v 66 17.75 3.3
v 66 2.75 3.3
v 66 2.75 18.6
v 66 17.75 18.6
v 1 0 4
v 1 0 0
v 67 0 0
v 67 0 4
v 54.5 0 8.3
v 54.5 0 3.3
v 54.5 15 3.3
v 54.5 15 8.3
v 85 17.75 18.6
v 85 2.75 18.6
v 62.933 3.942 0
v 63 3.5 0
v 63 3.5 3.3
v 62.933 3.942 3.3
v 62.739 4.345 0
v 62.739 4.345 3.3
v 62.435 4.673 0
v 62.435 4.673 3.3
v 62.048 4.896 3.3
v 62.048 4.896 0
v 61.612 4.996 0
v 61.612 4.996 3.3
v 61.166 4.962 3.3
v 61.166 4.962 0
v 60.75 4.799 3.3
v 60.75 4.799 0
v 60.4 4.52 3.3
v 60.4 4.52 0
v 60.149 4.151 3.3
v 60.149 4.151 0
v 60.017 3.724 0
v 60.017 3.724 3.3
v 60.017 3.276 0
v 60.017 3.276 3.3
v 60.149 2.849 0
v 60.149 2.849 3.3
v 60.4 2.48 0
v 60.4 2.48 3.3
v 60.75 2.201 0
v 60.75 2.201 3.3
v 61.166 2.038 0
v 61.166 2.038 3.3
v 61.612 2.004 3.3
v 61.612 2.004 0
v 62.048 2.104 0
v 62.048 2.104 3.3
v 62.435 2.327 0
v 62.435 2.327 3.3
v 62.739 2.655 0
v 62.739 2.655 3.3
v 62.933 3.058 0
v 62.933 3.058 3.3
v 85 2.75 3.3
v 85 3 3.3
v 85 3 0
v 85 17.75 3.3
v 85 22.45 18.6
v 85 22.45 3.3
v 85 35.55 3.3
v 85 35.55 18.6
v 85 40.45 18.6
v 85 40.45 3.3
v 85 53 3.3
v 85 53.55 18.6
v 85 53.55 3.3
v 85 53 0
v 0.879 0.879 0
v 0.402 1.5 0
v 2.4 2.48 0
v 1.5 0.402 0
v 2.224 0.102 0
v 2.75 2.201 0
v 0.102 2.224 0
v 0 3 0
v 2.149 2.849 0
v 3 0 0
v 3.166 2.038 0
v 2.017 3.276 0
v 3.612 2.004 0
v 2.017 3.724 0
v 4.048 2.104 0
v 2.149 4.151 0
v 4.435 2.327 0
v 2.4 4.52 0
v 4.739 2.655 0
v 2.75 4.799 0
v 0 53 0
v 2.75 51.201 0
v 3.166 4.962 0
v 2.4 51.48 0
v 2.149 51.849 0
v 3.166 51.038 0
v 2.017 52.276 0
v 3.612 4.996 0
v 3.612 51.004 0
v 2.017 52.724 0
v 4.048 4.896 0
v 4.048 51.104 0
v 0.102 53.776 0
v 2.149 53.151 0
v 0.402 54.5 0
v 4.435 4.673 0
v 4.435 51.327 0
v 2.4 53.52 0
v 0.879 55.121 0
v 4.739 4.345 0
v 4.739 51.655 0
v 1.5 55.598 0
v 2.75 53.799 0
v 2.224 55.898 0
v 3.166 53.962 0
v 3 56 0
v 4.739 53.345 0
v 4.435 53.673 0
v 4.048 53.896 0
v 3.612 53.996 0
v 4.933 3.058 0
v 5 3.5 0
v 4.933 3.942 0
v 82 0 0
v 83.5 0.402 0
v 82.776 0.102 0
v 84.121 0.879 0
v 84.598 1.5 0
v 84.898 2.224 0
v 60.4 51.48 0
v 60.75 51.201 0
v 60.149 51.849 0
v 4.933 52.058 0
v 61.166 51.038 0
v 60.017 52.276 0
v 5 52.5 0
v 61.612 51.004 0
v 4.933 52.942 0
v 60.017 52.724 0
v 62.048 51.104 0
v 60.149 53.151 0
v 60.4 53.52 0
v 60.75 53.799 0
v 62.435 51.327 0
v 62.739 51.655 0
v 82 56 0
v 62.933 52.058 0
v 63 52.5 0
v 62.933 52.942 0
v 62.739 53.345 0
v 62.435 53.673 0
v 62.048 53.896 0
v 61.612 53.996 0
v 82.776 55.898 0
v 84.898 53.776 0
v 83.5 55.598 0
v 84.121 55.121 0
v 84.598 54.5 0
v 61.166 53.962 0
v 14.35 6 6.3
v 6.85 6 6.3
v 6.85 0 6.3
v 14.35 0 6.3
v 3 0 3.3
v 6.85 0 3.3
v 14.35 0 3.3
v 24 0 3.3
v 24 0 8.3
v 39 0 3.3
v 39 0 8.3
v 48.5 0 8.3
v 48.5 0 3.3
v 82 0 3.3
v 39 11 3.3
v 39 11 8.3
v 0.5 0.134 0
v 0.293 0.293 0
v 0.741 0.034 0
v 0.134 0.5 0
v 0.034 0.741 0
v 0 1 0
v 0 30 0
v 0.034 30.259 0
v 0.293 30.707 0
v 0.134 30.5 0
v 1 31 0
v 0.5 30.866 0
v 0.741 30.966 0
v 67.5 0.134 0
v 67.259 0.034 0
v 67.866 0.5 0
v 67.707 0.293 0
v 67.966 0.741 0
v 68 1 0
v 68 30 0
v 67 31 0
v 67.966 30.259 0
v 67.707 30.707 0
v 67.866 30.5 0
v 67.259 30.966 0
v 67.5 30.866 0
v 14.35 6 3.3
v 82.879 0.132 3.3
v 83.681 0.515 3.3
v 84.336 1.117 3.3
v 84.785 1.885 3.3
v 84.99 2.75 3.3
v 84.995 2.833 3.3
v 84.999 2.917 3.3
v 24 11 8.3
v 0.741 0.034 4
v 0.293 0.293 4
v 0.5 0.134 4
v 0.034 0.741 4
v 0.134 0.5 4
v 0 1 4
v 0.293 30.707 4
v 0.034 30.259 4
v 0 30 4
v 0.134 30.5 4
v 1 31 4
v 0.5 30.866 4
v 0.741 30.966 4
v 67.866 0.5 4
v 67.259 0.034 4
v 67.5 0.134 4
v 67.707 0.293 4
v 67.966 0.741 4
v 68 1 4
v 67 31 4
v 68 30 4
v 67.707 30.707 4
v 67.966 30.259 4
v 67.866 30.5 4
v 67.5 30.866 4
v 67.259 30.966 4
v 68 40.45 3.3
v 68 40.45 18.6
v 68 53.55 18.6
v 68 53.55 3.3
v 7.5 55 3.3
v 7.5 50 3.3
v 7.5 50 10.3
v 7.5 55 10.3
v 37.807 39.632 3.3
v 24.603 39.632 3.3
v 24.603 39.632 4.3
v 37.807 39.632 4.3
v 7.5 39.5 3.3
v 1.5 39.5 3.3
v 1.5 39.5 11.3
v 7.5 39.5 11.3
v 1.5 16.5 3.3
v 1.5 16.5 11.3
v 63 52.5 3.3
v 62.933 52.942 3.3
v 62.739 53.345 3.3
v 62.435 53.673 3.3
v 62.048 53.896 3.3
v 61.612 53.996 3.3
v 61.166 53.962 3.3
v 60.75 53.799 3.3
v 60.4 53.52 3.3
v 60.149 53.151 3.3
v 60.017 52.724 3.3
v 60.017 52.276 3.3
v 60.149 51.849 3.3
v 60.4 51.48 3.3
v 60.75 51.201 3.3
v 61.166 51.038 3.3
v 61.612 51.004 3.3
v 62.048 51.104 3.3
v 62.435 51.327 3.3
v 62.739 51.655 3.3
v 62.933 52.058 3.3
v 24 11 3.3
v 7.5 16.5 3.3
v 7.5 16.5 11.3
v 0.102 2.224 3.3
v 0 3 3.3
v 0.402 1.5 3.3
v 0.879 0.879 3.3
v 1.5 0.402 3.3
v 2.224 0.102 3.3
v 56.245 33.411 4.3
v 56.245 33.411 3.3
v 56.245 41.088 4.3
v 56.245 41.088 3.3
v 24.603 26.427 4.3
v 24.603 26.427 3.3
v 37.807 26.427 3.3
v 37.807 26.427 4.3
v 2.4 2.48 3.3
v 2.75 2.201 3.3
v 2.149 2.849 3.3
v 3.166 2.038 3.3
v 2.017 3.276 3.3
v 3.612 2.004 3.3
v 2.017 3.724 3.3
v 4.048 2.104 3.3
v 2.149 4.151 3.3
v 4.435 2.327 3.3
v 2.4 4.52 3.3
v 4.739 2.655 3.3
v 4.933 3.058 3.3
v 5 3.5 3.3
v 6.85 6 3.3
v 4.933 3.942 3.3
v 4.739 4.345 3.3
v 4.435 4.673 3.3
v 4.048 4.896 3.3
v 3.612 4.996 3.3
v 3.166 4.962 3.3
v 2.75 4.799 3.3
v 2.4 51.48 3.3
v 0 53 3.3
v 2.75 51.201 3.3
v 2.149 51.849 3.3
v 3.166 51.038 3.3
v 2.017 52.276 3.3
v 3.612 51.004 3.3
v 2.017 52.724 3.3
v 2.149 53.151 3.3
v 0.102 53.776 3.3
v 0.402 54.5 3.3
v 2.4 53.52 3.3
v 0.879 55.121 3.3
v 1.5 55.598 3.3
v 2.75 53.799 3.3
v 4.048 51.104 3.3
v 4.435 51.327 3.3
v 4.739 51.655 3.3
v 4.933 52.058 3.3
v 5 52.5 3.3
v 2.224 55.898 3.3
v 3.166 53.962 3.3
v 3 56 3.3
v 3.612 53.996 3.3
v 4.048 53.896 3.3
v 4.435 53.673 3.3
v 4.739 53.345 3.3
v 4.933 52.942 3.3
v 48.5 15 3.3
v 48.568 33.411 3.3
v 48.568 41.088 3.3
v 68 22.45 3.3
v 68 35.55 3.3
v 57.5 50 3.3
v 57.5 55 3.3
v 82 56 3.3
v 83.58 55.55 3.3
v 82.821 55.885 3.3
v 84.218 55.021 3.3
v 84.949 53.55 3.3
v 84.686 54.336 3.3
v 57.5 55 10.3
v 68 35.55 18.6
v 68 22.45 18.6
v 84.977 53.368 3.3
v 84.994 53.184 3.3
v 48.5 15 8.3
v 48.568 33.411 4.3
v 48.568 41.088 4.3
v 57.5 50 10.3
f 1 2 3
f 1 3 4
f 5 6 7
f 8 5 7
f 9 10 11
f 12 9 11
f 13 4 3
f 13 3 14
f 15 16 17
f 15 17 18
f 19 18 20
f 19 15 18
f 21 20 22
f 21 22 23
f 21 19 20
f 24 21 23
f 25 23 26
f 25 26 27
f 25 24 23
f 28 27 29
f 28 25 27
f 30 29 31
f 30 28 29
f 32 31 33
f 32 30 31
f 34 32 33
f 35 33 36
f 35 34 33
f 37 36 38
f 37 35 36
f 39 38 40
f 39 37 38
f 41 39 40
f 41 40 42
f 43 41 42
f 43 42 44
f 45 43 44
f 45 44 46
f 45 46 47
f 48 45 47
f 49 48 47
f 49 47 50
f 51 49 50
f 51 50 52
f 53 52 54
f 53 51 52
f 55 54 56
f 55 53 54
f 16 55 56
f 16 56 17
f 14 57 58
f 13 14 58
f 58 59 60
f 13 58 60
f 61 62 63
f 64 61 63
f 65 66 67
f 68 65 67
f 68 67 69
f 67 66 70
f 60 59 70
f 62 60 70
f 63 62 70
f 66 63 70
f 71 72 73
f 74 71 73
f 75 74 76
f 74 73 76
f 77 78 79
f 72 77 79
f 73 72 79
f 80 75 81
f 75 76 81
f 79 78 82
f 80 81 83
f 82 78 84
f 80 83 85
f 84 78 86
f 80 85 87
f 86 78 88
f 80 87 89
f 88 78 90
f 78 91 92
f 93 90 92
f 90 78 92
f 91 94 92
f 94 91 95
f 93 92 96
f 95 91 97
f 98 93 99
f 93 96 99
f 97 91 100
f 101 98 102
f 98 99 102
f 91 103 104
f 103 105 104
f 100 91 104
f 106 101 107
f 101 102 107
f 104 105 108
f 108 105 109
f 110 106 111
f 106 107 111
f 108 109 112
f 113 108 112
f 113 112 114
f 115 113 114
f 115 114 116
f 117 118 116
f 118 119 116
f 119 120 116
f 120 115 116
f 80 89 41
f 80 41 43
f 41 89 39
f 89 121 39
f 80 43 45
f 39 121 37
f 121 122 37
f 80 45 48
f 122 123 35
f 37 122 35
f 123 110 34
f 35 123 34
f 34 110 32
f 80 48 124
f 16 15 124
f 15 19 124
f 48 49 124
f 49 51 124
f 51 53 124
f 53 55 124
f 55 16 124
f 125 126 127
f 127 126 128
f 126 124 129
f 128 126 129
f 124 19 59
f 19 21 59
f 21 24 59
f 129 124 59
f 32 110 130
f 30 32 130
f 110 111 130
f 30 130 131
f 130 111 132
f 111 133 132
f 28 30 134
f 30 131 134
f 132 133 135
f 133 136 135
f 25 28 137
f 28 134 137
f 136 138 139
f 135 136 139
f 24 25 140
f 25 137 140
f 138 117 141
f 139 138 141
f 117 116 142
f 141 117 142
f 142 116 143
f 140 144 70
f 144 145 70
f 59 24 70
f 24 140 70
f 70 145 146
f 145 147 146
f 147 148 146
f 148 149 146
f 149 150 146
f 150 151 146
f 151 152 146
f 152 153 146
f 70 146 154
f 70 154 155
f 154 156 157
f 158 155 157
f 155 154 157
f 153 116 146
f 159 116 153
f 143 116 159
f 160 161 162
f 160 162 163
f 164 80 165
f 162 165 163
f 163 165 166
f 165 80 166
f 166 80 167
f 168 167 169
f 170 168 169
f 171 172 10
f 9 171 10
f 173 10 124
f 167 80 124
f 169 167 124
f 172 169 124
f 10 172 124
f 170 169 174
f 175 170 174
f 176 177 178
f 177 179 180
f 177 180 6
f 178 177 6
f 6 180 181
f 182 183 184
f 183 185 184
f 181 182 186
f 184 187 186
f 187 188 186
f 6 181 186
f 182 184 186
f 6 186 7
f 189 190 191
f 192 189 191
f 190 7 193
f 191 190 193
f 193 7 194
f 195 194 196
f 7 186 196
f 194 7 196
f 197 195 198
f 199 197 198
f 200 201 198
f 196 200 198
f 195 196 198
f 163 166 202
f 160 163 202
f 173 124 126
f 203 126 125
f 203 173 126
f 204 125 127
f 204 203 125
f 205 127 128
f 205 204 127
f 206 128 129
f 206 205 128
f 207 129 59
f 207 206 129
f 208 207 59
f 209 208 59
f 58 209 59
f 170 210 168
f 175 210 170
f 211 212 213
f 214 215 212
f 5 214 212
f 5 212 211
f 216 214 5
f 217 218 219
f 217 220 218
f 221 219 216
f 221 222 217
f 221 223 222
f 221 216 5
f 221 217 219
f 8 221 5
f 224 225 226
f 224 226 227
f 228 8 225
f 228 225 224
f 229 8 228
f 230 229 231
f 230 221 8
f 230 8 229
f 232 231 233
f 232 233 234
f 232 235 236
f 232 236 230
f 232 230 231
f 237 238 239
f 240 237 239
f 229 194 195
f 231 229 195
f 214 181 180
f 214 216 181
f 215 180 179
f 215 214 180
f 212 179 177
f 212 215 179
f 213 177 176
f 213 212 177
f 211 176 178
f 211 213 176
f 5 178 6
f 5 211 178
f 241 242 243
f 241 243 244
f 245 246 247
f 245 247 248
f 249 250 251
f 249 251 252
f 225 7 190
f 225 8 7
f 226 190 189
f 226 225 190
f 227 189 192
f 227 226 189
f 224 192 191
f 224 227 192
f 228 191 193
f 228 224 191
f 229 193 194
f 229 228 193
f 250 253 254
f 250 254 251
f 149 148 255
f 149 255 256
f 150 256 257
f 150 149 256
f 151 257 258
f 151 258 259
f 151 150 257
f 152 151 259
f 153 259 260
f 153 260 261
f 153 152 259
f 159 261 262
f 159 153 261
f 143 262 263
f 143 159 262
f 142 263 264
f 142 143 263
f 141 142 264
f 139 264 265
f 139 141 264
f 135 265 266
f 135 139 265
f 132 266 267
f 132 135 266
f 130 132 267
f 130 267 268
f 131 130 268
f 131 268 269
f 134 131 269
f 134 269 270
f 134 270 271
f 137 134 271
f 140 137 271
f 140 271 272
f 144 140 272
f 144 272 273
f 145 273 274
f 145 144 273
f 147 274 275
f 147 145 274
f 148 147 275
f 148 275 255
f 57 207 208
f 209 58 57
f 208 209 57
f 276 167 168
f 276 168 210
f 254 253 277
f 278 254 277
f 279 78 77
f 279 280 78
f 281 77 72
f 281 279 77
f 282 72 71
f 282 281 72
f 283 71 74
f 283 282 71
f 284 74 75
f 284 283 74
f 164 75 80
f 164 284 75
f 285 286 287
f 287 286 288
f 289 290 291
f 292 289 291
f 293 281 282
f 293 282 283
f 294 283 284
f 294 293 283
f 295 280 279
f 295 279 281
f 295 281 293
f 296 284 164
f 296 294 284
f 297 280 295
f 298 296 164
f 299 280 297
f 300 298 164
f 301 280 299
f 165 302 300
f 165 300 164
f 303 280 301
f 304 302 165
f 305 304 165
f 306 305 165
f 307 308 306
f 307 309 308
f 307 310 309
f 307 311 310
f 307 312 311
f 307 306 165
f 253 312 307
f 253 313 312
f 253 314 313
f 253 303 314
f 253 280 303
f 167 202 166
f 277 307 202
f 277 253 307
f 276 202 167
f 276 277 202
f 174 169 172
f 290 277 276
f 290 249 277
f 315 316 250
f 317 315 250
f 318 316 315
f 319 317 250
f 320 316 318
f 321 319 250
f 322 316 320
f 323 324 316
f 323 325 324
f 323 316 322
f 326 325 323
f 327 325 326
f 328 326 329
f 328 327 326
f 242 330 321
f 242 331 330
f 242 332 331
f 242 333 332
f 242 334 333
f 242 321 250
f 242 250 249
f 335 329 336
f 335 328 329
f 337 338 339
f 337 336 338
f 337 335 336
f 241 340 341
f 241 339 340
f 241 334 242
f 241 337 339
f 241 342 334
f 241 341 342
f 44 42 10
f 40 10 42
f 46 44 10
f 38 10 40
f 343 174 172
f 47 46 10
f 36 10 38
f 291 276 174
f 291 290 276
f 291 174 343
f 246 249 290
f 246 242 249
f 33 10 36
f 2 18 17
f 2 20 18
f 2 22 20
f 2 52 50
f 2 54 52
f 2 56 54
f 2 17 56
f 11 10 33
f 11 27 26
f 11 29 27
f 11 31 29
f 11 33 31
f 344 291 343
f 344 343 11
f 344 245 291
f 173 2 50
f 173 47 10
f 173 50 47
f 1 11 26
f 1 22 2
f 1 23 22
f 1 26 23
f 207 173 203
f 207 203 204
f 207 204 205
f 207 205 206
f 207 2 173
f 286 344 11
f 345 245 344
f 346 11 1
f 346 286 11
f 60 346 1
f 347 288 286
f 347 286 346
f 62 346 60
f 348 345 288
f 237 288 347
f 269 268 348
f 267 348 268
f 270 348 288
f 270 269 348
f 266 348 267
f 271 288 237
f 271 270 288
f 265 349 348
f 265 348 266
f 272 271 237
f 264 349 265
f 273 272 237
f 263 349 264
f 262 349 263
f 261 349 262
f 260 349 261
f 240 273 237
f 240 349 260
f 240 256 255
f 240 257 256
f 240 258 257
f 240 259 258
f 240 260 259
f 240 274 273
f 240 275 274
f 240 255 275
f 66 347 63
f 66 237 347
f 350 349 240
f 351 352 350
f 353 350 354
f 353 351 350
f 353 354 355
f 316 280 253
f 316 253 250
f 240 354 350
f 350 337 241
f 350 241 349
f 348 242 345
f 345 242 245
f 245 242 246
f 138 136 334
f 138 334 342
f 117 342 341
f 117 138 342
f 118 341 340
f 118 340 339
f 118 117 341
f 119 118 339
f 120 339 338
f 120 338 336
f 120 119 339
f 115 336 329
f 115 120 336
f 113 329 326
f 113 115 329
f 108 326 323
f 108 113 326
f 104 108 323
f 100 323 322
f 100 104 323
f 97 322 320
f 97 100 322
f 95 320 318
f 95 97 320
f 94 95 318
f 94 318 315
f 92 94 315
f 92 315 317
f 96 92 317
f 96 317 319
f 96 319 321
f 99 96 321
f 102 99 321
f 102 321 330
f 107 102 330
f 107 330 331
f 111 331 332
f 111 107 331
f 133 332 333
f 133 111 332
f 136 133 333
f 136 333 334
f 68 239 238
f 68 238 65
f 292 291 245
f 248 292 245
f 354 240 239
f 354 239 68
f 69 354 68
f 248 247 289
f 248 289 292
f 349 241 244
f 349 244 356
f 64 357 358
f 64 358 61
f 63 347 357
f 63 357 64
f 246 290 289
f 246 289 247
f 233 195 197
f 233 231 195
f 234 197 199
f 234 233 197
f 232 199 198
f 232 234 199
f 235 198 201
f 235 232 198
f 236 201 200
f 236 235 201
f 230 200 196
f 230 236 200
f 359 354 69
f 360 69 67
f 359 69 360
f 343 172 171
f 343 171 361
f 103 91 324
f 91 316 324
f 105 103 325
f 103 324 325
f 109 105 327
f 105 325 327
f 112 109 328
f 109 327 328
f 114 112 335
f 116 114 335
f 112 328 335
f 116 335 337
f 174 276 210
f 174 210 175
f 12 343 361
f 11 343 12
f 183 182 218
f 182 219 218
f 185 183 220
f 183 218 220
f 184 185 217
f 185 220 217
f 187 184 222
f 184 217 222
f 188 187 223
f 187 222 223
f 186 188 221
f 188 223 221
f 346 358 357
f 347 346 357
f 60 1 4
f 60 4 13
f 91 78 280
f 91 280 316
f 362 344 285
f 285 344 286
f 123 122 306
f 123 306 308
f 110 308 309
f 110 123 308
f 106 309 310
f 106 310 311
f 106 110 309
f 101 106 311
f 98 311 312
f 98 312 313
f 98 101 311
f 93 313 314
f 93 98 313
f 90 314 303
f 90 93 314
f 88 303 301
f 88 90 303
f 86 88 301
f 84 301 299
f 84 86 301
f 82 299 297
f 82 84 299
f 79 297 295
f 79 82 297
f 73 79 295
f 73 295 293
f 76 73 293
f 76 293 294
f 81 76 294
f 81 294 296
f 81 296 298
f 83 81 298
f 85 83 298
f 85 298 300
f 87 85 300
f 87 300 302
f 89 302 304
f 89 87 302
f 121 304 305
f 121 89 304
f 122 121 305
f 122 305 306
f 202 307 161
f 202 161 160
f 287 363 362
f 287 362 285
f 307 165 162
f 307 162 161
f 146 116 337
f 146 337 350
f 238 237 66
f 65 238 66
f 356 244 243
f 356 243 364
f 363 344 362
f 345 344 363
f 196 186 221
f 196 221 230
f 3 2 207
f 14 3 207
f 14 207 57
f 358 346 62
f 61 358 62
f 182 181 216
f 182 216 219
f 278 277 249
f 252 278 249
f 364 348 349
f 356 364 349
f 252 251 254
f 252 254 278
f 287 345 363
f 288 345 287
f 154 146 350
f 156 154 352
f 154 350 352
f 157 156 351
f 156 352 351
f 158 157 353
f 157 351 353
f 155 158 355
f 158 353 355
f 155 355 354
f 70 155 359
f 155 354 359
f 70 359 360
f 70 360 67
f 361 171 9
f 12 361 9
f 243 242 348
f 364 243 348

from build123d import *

# Parameters (mm, degrees)
F0_W      = 85
F0_H      = 56
F0_R      = 1.5
F1_DEPTH  = 3.3
F2_R      = 3
F3_W      = 50
F3_H      = 5
F4_DEPTH  = 7
F5_W      = 6
F5_H      = 23
F6_DEPTH  = 8
F7_W      = 17
F7_H      = 13.1
F7_W_2    = 19
F7_H_2    = 15
F8_DEPTH  = 15.3
F9_W      = 15
F9_H      = 11
F10_DEPTH = 5
F11_W     = 7.5
F11_H     = 6
F12_DEPTH = 3
F13_W     = 6
F13_H     = 15
F14_DEPTH = 5
F15_W     = 13.20453
F15_H     = 13.20453
F15_W_2   = 7.676441
F15_H_2   = 7.676441
F16_DEPTH = 1
F17_W     = 68
F17_H     = 31
F18_DEPTH = 4
F19_R     = 1


with BuildPart() as f1:
    # F0 (on Top) → F1 (new body)
    with BuildSketch(Plane.XY):
        with Locations((42.5, 28)):
            Rectangle(F0_W, F0_H)
        with Locations((3.5, 3.5)):
            Circle(F0_R, mode=Mode.SUBTRACT)
        with Locations((61.5, 3.5)):
            Circle(F0_R, mode=Mode.SUBTRACT)
        with Locations((3.5, 52.5)):
            Circle(F0_R, mode=Mode.SUBTRACT)
        with Locations((61.5, 52.5)):
            Circle(F0_R, mode=Mode.SUBTRACT)
    extrude(amount=F1_DEPTH)

    # F2
    f2_edges = [f1.edges().sort_by_distance(p)[0] for p in [
        (0, 56, 1.65),
        (85, 56, 1.65),
        (0, 0, 1.65),
        (85, 0, 1.65),
    ]]
    fillet(f2_edges, radius=F2_R)

    # F3 (on face) → F4 (join)
    with BuildSketch(Plane.XY.offset(3.3)):
        with Locations((32.5, 52.5)):
            Rectangle(F3_W, F3_H)
    extrude(amount=F4_DEPTH)

    # F5 (on face) → F6 (join)
    with BuildSketch(Plane.XY.offset(3.3)):
        with Locations((4.5, 28)):
            Rectangle(F5_W, F5_H)
    extrude(amount=F6_DEPTH)

    # F7 (on face) → F8 (join)
    with BuildSketch(Plane.XY.offset(3.3)):
        with Locations((76.5, 47)):
            Rectangle(F7_W, F7_H)
        with Locations((76.5, 29)):
            Rectangle(F7_W, F7_H)
        with Locations((75.5, 10.25)):
            Rectangle(F7_W_2, F7_H_2)
    extrude(amount=F8_DEPTH)

    # F9 (on face) → F10 (join)
    with BuildSketch(Plane.XY.offset(3.3)):
        with Locations((31.5, 5.5)):
            Rectangle(F9_W, F9_H)
    extrude(amount=F10_DEPTH)

    # F11 (on face) → F12 (join)
    with BuildSketch(Plane.XY.offset(3.3)):
        with Locations((10.6, 3)):
            Rectangle(F11_W, F11_H)
    extrude(amount=F12_DEPTH)

    # F13 (on face) → F14 (join)
    with BuildSketch(Plane.XY.offset(3.3)):
        with Locations((51.5, 7.5)):
            Rectangle(F13_W, F13_H)
    extrude(amount=F14_DEPTH)

    # F15 (on face) → F16 (join)
    with BuildSketch(Plane.XY.offset(3.3)):
        with Locations((31.205079, 33.029746)):
            Rectangle(F15_W, F15_H)
        with Locations((52.406295, 37.249581)):
            Rectangle(F15_W_2, F15_H_2)
    extrude(amount=F16_DEPTH)


with BuildPart() as f18:
    # F17 (on Top) → F18 (new body)
    with BuildSketch(Plane.XY):
        with Locations((34, 15.5)):
            Rectangle(F17_W, F17_H)
    extrude(amount=F18_DEPTH)

    # F19
    f19_edges = [f18.edges().sort_by_distance(p)[0] for p in [
        (68, 0, 2),
        (68, 31, 2),
        (0, 0, 2),
        (0, 31, 2),
    ]]
    fillet(f19_edges, radius=F19_R)


solid = Compound([f1.part, f18.part])
